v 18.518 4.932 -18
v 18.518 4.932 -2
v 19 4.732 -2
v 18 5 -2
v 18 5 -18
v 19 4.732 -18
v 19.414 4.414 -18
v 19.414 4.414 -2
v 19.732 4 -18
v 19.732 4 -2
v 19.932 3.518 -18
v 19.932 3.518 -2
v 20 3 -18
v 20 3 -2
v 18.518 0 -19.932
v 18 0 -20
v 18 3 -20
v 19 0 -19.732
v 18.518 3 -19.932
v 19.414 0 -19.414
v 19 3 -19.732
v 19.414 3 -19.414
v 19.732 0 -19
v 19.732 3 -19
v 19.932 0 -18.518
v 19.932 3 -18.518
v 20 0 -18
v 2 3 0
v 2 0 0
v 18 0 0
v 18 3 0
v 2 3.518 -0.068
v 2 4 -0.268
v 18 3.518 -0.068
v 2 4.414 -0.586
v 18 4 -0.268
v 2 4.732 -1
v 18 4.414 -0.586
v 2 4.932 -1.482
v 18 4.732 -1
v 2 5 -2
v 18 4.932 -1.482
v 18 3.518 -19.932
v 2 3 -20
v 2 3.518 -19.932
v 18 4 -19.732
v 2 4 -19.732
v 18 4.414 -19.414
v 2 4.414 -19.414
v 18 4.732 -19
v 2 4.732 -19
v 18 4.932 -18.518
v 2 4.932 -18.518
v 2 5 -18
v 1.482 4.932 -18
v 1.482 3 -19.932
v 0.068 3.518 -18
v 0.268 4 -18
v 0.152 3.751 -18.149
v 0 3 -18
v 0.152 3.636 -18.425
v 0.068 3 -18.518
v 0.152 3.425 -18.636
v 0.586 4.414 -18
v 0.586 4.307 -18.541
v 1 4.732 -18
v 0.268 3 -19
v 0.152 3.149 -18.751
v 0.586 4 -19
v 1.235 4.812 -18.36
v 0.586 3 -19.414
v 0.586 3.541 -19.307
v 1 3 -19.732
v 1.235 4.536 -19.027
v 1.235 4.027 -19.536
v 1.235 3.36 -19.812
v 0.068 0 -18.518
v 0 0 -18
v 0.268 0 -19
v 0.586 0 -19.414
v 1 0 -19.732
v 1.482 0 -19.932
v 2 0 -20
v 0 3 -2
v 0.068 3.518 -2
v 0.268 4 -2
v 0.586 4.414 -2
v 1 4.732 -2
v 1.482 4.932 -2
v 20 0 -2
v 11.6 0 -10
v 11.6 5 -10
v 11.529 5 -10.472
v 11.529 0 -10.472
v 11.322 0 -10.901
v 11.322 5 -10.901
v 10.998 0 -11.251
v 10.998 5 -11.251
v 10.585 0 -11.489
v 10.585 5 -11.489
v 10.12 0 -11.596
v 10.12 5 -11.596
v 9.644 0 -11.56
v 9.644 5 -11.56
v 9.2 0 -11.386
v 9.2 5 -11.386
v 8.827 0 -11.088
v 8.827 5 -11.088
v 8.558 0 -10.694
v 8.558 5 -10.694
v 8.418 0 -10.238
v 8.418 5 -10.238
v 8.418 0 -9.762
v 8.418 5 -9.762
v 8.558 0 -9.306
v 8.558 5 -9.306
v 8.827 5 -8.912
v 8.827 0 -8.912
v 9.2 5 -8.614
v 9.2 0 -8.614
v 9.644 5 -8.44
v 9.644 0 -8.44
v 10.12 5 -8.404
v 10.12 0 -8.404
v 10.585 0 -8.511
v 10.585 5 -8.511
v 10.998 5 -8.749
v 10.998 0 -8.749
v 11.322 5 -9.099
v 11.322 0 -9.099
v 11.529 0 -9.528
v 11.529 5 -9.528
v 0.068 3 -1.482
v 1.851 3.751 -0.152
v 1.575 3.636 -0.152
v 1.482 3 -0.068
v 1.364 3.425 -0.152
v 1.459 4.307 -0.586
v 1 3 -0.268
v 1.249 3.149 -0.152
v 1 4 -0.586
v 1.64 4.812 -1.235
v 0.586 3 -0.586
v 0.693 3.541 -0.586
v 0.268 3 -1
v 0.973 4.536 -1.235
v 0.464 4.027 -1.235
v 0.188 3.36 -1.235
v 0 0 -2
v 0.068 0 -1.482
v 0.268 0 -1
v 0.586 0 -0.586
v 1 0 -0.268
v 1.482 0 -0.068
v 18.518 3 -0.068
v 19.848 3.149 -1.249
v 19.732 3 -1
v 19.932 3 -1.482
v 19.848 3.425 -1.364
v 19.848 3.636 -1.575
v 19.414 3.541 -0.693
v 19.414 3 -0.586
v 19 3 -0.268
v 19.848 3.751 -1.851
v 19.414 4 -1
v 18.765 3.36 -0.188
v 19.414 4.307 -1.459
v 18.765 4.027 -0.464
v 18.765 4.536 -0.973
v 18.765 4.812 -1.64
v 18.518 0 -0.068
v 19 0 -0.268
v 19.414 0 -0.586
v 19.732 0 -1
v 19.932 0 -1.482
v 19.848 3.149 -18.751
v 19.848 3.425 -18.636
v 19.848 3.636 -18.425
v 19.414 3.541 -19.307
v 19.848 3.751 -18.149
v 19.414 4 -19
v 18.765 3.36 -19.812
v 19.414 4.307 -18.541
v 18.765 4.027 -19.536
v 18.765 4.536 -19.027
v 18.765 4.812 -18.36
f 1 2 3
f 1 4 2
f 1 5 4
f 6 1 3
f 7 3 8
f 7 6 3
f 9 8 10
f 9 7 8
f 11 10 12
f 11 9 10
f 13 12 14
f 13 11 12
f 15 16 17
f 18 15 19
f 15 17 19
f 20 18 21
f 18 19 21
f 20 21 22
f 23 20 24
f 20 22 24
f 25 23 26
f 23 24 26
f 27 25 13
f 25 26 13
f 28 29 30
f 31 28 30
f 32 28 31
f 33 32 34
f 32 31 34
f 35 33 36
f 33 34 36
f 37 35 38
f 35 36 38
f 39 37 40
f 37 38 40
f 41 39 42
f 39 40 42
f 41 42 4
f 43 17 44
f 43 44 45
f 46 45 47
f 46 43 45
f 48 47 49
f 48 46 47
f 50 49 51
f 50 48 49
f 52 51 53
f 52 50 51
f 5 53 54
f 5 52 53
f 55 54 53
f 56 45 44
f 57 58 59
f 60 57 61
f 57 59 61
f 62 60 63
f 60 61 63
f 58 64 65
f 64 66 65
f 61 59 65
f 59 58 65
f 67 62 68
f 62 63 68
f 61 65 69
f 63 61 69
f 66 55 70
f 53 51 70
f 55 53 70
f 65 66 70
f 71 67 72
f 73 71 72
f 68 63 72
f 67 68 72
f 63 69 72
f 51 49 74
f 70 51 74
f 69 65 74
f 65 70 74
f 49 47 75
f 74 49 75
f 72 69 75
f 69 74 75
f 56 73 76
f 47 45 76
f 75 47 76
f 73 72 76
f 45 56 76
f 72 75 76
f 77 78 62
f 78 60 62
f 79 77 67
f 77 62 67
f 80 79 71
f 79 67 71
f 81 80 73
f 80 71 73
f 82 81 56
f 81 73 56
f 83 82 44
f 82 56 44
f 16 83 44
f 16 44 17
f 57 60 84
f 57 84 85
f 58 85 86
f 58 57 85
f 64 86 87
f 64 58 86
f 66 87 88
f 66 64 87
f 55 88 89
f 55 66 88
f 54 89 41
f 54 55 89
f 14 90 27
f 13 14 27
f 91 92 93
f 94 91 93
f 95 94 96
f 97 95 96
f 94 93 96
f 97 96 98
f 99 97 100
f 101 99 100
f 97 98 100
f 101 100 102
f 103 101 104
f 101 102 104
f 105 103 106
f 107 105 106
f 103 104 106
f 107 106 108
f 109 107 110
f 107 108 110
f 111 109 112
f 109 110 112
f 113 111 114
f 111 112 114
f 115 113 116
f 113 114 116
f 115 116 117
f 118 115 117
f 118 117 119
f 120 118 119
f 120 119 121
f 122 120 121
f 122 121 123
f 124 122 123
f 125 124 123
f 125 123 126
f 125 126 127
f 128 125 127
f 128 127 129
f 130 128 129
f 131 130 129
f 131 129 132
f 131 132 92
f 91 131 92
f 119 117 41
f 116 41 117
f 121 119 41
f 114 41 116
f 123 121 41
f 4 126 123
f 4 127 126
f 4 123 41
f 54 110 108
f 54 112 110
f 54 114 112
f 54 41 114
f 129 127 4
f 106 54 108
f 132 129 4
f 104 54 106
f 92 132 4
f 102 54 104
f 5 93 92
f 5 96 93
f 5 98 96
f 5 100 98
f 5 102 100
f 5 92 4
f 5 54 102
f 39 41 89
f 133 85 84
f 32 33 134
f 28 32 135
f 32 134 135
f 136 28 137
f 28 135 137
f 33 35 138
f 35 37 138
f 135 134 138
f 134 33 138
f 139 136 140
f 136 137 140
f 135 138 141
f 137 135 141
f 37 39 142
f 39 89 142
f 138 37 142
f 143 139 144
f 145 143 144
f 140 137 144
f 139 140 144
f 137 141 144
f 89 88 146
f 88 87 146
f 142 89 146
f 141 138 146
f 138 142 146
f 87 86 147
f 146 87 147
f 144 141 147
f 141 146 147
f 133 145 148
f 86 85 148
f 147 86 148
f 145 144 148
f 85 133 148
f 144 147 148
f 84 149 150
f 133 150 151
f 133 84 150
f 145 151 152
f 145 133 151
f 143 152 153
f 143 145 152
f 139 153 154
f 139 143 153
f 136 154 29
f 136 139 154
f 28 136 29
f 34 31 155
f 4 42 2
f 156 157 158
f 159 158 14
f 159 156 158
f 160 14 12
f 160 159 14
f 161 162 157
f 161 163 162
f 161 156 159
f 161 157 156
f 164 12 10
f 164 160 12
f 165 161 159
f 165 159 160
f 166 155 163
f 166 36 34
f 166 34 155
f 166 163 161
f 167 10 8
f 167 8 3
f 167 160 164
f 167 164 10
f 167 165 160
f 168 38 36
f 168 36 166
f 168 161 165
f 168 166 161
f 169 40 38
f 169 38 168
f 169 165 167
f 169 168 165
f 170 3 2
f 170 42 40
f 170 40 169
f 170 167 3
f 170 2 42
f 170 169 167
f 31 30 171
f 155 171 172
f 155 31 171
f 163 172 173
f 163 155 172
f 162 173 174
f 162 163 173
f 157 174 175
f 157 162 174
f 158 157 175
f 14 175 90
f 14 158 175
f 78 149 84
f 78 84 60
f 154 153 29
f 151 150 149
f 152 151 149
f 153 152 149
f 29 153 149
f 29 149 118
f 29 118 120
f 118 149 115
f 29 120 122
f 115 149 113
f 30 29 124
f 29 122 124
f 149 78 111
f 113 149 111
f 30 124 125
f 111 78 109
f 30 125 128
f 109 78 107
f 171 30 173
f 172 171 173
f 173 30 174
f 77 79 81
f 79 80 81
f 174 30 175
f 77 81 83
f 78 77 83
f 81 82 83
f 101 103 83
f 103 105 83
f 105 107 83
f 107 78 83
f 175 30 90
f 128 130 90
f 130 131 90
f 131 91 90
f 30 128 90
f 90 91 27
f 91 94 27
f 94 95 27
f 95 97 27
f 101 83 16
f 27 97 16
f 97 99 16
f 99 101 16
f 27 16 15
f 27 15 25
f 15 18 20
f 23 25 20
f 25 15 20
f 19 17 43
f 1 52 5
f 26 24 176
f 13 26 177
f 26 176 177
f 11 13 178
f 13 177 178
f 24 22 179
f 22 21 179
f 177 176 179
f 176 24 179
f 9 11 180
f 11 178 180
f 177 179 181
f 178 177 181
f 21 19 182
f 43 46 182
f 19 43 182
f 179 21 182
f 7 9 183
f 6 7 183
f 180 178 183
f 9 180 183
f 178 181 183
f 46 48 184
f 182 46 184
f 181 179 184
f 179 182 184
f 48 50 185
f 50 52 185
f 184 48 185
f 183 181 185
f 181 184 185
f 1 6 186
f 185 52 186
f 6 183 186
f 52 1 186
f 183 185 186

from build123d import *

# Parameters (mm, degrees)
SKETCH2_W           = 20
SKETCH2_H           = 20
BOSS_EXTRUDE1_DEPTH = 5
SKETCH3_R           = 1.6
CUT_EXTRUDE1_DEPTH  = 6
FILLET1_R           = 2


with BuildPart() as part:
    # Sketch2 → Boss-Extrude1 (new body)
    with BuildSketch(Plane(origin=(0, 0, 0), x_dir=(1, 0, 0), z_dir=(0, 1, 0))):
        with Locations((10, 10)):
            Rectangle(SKETCH2_W, SKETCH2_H)
    extrude(amount=BOSS_EXTRUDE1_DEPTH)

    # Sketch3 → Cut-Extrude1 (cut, through all)
    with BuildSketch(Plane(origin=(0, 5, 0), x_dir=(1, 0, 0), z_dir=(0, 1, 0))):
        with Locations((10, 10)):
            Circle(SKETCH3_R)
    extrude(amount=-CUT_EXTRUDE1_DEPTH, mode=Mode.SUBTRACT)

    # Fillet1
    fillet1_edges = [part.edges().sort_by_distance(p)[0] for p in [
        (10, 5, -20),
        (0, 5, -10),
        (10, 5, 0),
        (0, 2.5, 0),
        (0, 2.5, -20),
        (20, 2.5, -20),
        (20, 2.5, 0),
        (20, 5, -10),
    ]]
    fillet(fillet1_edges, radius=FILLET1_R)


solid = part.part
